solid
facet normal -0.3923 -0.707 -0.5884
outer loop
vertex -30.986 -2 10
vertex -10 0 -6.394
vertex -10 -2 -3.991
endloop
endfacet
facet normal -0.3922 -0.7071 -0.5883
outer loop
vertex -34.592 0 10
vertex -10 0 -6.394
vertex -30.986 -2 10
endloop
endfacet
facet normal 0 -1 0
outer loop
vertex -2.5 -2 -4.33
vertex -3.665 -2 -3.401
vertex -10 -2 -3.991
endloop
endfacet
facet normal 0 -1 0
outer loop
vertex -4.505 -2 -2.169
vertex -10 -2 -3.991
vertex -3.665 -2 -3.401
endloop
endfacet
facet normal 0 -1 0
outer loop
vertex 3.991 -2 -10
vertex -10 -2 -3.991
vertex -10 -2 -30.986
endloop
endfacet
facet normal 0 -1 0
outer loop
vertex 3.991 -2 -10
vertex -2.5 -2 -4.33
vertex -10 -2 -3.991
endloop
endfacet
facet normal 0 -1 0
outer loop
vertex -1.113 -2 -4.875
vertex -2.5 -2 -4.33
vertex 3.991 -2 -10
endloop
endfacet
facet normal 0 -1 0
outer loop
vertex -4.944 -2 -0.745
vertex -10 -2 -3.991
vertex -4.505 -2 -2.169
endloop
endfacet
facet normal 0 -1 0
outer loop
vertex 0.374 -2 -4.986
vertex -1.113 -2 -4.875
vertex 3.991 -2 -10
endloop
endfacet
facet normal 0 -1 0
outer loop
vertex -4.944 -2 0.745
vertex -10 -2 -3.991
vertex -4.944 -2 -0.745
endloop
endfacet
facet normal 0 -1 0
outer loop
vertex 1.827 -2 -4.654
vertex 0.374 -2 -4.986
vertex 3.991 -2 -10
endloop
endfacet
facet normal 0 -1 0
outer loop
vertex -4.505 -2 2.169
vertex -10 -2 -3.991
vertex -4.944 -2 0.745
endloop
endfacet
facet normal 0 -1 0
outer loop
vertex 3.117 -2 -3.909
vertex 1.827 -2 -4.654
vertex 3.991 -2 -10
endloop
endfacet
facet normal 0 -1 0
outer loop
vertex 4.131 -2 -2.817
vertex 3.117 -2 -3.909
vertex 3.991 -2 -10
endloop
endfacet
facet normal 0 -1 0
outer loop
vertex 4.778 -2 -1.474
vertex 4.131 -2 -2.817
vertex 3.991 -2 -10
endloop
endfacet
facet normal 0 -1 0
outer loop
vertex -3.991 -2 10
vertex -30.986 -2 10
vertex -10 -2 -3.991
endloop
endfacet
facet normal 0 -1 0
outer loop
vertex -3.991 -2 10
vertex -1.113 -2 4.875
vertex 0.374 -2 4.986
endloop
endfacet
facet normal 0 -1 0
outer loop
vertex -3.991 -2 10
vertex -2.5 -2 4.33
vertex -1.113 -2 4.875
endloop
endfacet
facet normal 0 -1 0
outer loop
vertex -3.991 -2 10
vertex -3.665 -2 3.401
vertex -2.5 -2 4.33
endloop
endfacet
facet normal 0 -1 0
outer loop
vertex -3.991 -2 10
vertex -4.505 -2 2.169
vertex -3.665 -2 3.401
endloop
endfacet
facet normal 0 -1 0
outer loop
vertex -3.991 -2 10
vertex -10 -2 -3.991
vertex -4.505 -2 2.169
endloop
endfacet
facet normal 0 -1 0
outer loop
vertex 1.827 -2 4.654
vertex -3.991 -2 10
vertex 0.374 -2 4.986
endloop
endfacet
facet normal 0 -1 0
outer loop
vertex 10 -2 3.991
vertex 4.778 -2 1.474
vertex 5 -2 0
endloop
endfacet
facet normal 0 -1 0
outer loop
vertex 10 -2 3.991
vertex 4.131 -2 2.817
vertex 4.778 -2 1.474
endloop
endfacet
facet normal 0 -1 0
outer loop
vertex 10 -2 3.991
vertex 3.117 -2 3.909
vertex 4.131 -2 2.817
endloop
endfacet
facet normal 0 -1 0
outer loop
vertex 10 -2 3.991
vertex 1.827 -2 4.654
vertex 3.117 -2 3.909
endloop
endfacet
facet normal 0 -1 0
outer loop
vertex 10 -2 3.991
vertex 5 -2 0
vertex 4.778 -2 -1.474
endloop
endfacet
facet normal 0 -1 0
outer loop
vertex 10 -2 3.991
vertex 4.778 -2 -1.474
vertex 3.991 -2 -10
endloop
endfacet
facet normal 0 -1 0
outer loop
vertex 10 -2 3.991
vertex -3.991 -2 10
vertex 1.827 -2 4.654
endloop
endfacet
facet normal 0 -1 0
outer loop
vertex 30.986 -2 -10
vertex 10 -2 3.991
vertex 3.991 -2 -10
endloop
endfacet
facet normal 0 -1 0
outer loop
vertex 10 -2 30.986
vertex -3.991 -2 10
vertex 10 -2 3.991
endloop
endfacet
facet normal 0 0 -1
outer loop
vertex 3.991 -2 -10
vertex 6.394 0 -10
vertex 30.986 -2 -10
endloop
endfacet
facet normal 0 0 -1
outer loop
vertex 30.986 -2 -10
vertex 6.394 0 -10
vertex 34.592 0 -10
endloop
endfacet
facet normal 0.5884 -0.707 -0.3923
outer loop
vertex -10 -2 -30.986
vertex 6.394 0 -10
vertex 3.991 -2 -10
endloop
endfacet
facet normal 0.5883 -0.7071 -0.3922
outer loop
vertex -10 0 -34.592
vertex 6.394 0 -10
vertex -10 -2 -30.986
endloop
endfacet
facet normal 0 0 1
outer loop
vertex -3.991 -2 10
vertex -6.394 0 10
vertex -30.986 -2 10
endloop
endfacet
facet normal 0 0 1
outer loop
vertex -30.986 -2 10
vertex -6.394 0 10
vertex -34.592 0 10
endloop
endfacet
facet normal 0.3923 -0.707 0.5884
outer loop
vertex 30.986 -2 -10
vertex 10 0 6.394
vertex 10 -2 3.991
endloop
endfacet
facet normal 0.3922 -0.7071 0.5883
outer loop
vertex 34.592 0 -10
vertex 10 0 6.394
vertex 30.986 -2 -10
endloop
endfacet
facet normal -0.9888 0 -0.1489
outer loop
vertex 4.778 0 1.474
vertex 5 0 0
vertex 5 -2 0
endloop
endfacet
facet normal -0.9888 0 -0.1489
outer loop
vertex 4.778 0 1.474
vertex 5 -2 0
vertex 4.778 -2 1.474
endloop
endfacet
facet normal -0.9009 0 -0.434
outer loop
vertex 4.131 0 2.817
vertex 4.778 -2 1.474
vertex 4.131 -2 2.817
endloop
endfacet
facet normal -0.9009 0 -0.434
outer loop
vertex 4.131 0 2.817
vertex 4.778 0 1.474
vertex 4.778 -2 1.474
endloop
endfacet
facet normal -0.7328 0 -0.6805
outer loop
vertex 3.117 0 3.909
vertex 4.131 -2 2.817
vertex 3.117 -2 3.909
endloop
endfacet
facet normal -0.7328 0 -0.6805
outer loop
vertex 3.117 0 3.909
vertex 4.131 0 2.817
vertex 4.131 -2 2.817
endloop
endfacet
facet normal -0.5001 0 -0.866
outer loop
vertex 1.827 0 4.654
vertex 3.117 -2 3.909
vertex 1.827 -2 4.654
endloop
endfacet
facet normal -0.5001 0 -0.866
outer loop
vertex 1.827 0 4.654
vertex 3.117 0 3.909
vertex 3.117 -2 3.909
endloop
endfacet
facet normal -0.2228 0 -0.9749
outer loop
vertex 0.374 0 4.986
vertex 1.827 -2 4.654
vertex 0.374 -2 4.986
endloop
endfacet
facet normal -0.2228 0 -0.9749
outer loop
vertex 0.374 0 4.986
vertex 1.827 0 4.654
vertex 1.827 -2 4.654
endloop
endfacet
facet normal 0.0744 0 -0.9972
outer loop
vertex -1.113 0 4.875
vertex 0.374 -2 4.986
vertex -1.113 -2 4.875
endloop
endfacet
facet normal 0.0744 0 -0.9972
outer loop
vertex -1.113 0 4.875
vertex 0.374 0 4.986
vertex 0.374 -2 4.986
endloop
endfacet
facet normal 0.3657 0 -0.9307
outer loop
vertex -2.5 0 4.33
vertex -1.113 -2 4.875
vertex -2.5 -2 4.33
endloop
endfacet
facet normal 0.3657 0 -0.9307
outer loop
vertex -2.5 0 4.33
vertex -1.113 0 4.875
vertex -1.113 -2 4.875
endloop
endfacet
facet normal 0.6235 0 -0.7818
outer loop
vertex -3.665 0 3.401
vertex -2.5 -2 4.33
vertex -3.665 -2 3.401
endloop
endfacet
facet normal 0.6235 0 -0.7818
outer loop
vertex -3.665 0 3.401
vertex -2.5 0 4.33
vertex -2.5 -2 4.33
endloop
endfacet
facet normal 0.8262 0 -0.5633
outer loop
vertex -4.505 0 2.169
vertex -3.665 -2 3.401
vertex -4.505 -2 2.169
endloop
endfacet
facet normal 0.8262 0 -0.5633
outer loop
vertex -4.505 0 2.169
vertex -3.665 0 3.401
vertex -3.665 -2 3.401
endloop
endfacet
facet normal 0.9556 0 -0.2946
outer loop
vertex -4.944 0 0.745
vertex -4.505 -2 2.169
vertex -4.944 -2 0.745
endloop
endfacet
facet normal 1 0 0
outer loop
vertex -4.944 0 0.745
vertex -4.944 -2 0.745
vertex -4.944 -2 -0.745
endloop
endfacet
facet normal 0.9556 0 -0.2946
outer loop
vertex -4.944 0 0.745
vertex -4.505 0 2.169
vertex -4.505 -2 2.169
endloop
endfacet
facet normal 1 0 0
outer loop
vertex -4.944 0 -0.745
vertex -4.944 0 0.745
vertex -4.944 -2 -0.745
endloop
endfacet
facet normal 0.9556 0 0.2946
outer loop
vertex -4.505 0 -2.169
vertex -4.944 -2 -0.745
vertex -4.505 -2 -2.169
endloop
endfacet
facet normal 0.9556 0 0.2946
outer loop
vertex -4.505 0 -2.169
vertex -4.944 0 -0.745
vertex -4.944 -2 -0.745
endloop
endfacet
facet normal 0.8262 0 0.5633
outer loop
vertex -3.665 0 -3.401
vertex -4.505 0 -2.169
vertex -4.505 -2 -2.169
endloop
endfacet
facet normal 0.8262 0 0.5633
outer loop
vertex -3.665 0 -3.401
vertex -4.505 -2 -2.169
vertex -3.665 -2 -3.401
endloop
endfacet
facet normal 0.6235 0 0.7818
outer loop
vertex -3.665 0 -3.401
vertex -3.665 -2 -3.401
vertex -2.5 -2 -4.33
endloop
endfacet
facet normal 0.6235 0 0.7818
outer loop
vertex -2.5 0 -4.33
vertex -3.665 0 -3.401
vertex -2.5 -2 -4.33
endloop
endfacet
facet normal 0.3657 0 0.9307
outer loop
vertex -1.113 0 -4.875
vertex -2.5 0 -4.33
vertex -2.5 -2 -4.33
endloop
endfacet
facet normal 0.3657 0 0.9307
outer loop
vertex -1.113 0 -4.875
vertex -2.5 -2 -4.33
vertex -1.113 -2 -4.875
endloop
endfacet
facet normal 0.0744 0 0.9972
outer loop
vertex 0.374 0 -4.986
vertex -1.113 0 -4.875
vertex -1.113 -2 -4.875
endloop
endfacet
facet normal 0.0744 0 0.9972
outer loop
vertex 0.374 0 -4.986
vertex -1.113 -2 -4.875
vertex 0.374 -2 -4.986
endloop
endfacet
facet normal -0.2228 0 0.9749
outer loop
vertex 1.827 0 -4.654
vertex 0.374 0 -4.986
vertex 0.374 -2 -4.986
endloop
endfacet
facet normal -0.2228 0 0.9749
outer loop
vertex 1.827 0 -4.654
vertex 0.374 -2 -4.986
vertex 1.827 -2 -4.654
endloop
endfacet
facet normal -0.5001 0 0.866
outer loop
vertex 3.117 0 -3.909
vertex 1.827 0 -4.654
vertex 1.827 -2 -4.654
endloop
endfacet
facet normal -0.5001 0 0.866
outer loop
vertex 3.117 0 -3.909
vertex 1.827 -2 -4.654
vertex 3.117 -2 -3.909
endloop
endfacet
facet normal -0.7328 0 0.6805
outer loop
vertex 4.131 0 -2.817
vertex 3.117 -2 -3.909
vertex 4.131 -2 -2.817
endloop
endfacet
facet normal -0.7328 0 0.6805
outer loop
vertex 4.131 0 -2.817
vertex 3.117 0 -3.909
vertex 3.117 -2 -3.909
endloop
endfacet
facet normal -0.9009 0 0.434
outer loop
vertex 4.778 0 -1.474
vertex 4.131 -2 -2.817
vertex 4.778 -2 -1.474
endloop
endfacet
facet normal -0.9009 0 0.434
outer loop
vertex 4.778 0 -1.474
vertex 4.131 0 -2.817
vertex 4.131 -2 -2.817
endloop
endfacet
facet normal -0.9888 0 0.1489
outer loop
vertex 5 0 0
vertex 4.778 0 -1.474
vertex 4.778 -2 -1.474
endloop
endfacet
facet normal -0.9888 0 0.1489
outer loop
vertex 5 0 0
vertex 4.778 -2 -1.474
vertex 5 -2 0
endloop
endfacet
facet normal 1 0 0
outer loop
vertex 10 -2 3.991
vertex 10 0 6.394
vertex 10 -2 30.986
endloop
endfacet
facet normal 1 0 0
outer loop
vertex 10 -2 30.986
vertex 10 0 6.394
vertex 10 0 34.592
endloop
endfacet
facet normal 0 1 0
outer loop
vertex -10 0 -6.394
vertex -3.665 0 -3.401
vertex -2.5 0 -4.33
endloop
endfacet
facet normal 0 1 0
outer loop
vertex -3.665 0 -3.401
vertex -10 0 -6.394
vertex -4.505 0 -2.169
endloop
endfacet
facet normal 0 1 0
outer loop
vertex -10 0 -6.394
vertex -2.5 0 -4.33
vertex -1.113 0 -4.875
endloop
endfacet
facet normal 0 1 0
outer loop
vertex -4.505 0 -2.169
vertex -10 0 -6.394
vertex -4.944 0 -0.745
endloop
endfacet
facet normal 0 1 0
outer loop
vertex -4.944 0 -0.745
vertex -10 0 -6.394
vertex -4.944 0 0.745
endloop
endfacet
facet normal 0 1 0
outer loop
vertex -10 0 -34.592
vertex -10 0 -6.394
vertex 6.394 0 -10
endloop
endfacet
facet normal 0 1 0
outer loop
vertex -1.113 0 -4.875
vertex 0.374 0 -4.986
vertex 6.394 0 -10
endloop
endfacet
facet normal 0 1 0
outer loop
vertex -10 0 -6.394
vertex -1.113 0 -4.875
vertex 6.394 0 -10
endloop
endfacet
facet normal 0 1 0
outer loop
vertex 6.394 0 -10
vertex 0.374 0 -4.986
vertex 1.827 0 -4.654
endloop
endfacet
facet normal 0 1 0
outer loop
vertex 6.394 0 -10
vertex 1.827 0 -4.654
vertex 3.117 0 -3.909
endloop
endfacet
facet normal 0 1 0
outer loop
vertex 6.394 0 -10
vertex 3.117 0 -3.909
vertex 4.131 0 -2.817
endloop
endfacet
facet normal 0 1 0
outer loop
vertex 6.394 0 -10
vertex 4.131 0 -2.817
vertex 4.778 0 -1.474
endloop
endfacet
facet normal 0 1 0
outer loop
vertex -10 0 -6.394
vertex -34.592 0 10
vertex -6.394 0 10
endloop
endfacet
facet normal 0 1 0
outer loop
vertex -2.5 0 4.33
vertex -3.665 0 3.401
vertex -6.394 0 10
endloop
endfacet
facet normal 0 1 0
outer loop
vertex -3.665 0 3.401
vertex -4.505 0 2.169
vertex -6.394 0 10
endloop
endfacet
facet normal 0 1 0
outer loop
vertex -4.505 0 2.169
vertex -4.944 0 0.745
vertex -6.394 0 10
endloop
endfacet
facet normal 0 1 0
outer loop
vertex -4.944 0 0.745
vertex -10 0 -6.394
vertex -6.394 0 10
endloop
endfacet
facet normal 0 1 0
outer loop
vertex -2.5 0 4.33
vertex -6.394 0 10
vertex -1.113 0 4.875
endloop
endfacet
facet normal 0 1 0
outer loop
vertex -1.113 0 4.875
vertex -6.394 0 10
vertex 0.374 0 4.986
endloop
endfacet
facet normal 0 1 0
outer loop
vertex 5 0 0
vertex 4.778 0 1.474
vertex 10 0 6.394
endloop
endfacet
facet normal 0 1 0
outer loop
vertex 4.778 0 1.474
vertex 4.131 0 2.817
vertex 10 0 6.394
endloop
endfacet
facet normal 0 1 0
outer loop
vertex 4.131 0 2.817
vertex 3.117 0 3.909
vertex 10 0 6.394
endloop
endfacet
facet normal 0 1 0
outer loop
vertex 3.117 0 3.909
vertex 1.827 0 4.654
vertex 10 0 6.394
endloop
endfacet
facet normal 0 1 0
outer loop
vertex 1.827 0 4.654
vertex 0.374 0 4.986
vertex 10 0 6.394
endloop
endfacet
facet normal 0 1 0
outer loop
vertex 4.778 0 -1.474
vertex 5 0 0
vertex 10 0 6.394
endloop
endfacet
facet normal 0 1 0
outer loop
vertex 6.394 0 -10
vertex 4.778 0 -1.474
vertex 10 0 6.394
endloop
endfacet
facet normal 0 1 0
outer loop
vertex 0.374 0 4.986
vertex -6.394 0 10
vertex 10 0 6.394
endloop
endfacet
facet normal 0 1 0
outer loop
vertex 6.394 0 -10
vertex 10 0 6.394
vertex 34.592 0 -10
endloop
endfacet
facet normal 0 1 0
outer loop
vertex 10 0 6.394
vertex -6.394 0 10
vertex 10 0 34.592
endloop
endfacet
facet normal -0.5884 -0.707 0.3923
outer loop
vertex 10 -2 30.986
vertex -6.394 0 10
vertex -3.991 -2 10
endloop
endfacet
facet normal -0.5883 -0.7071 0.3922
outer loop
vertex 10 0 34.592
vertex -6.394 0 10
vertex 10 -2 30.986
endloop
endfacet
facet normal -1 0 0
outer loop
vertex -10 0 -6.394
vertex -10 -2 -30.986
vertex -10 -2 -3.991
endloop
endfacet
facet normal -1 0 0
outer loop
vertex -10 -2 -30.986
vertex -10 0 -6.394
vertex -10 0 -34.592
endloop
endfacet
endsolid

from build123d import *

# Parameters (mm, degrees)
F0_R         = 5
F1_DEPTH     = 2
F2_T4_DEPTH  = 61.7723426343
F2_T9_DEPTH  = 61.7723426343
F2_T14_DEPTH = 61.7723426343
F2_T19_DEPTH = 61.7723426343


# Not quite as in the source:
# - a fillet or chamfer that OpenCascade refuses, or shapes differently, is made with other operations: its cross-section is extruded or revolved along the edge and cut away or added


with BuildPart() as f1:
    # F0 (on Front) → F1 (new body)
    with BuildSketch(Plane.XZ):
        Polygon((10, 40), (-10, 10), (-40, 10), (-10, -10), (-10, -40), (10, -10), (40, -10), (10, 10), align=None)
        Circle(F0_R, mode=Mode.SUBTRACT)
    extrude(amount=F1_DEPTH)

    # F2: chamfer of 5 on 4 edges, made by hand


with BuildPart() as f2_tool2:
    # F2_s3 → F2_t4 (new body)
    with BuildSketch(Plane(origin=(43.0065402431, 0, -28.6710268287), x_dir=(0, 1, 0), z_dir=(-0.8320502943, 0, 0.5547001962))):
        Polygon((3, -13.8675049056), (-2, -8.8675049056), (-2, -13.8675049056), align=None)
    extrude(amount=F2_T4_DEPTH)

    split(bisect_by=Plane.YZ.offset(10), keep=Keep.TOP)


with BuildPart() as f1_1:
    add(f1.part)

    # F2_t1: cut F2_tool2
    add(f2_tool2.part, mode=Mode.SUBTRACT)


with BuildPart() as f2_tool7:
    # F2_s8 → F2_t9 (new body)
    with BuildSketch(Plane(origin=(28.6710268287, 0, 43.0065402431), x_dir=(0, 1, 0), z_dir=(-0.5547001962, 0, -0.8320502943))):
        Polygon((3, -13.8675049056), (-2, -8.8675049056), (-2, -13.8675049056), align=None)
    extrude(amount=F2_T9_DEPTH)

    split(bisect_by=Plane.XY.offset(10), keep=Keep.TOP)


with BuildPart() as f1_2:
    add(f1_1.part)

    # F2_t6: cut F2_tool7
    add(f2_tool7.part, mode=Mode.SUBTRACT)


with BuildPart() as f2_tool12:
    # F2_s13 → F2_t14 (new body)
    with BuildSketch(Plane(origin=(-43.0065402431, 0, 28.6710268287), x_dir=(0, 1, 0), z_dir=(0.8320502943, 0, -0.5547001962))):
        Polygon((3, -13.8675049056), (-2, -8.8675049056), (-2, -13.8675049056), align=None)
    extrude(amount=F2_T14_DEPTH)

    split(bisect_by=Plane.YZ.offset(-10), keep=Keep.BOTTOM)


with BuildPart() as f1_3:
    add(f1_2.part)

    # F2_t11: cut F2_tool12
    add(f2_tool12.part, mode=Mode.SUBTRACT)


with BuildPart() as f2_tool17:
    # F2_s18 → F2_t19 (new body)
    with BuildSketch(Plane(origin=(-28.6710268287, 0, -43.0065402431), x_dir=(0, 1, 0), z_dir=(0.5547001962, 0, 0.8320502943))):
        Polygon((3, -13.8675049056), (-2, -8.8675049056), (-2, -13.8675049056), align=None)
    extrude(amount=F2_T19_DEPTH)

    split(bisect_by=Plane.XY.offset(-10), keep=Keep.BOTTOM)


with BuildPart() as f1_4:
    add(f1_3.part)

    # F2_t16: cut F2_tool17
    add(f2_tool17.part, mode=Mode.SUBTRACT)


solid = f1_4.part
